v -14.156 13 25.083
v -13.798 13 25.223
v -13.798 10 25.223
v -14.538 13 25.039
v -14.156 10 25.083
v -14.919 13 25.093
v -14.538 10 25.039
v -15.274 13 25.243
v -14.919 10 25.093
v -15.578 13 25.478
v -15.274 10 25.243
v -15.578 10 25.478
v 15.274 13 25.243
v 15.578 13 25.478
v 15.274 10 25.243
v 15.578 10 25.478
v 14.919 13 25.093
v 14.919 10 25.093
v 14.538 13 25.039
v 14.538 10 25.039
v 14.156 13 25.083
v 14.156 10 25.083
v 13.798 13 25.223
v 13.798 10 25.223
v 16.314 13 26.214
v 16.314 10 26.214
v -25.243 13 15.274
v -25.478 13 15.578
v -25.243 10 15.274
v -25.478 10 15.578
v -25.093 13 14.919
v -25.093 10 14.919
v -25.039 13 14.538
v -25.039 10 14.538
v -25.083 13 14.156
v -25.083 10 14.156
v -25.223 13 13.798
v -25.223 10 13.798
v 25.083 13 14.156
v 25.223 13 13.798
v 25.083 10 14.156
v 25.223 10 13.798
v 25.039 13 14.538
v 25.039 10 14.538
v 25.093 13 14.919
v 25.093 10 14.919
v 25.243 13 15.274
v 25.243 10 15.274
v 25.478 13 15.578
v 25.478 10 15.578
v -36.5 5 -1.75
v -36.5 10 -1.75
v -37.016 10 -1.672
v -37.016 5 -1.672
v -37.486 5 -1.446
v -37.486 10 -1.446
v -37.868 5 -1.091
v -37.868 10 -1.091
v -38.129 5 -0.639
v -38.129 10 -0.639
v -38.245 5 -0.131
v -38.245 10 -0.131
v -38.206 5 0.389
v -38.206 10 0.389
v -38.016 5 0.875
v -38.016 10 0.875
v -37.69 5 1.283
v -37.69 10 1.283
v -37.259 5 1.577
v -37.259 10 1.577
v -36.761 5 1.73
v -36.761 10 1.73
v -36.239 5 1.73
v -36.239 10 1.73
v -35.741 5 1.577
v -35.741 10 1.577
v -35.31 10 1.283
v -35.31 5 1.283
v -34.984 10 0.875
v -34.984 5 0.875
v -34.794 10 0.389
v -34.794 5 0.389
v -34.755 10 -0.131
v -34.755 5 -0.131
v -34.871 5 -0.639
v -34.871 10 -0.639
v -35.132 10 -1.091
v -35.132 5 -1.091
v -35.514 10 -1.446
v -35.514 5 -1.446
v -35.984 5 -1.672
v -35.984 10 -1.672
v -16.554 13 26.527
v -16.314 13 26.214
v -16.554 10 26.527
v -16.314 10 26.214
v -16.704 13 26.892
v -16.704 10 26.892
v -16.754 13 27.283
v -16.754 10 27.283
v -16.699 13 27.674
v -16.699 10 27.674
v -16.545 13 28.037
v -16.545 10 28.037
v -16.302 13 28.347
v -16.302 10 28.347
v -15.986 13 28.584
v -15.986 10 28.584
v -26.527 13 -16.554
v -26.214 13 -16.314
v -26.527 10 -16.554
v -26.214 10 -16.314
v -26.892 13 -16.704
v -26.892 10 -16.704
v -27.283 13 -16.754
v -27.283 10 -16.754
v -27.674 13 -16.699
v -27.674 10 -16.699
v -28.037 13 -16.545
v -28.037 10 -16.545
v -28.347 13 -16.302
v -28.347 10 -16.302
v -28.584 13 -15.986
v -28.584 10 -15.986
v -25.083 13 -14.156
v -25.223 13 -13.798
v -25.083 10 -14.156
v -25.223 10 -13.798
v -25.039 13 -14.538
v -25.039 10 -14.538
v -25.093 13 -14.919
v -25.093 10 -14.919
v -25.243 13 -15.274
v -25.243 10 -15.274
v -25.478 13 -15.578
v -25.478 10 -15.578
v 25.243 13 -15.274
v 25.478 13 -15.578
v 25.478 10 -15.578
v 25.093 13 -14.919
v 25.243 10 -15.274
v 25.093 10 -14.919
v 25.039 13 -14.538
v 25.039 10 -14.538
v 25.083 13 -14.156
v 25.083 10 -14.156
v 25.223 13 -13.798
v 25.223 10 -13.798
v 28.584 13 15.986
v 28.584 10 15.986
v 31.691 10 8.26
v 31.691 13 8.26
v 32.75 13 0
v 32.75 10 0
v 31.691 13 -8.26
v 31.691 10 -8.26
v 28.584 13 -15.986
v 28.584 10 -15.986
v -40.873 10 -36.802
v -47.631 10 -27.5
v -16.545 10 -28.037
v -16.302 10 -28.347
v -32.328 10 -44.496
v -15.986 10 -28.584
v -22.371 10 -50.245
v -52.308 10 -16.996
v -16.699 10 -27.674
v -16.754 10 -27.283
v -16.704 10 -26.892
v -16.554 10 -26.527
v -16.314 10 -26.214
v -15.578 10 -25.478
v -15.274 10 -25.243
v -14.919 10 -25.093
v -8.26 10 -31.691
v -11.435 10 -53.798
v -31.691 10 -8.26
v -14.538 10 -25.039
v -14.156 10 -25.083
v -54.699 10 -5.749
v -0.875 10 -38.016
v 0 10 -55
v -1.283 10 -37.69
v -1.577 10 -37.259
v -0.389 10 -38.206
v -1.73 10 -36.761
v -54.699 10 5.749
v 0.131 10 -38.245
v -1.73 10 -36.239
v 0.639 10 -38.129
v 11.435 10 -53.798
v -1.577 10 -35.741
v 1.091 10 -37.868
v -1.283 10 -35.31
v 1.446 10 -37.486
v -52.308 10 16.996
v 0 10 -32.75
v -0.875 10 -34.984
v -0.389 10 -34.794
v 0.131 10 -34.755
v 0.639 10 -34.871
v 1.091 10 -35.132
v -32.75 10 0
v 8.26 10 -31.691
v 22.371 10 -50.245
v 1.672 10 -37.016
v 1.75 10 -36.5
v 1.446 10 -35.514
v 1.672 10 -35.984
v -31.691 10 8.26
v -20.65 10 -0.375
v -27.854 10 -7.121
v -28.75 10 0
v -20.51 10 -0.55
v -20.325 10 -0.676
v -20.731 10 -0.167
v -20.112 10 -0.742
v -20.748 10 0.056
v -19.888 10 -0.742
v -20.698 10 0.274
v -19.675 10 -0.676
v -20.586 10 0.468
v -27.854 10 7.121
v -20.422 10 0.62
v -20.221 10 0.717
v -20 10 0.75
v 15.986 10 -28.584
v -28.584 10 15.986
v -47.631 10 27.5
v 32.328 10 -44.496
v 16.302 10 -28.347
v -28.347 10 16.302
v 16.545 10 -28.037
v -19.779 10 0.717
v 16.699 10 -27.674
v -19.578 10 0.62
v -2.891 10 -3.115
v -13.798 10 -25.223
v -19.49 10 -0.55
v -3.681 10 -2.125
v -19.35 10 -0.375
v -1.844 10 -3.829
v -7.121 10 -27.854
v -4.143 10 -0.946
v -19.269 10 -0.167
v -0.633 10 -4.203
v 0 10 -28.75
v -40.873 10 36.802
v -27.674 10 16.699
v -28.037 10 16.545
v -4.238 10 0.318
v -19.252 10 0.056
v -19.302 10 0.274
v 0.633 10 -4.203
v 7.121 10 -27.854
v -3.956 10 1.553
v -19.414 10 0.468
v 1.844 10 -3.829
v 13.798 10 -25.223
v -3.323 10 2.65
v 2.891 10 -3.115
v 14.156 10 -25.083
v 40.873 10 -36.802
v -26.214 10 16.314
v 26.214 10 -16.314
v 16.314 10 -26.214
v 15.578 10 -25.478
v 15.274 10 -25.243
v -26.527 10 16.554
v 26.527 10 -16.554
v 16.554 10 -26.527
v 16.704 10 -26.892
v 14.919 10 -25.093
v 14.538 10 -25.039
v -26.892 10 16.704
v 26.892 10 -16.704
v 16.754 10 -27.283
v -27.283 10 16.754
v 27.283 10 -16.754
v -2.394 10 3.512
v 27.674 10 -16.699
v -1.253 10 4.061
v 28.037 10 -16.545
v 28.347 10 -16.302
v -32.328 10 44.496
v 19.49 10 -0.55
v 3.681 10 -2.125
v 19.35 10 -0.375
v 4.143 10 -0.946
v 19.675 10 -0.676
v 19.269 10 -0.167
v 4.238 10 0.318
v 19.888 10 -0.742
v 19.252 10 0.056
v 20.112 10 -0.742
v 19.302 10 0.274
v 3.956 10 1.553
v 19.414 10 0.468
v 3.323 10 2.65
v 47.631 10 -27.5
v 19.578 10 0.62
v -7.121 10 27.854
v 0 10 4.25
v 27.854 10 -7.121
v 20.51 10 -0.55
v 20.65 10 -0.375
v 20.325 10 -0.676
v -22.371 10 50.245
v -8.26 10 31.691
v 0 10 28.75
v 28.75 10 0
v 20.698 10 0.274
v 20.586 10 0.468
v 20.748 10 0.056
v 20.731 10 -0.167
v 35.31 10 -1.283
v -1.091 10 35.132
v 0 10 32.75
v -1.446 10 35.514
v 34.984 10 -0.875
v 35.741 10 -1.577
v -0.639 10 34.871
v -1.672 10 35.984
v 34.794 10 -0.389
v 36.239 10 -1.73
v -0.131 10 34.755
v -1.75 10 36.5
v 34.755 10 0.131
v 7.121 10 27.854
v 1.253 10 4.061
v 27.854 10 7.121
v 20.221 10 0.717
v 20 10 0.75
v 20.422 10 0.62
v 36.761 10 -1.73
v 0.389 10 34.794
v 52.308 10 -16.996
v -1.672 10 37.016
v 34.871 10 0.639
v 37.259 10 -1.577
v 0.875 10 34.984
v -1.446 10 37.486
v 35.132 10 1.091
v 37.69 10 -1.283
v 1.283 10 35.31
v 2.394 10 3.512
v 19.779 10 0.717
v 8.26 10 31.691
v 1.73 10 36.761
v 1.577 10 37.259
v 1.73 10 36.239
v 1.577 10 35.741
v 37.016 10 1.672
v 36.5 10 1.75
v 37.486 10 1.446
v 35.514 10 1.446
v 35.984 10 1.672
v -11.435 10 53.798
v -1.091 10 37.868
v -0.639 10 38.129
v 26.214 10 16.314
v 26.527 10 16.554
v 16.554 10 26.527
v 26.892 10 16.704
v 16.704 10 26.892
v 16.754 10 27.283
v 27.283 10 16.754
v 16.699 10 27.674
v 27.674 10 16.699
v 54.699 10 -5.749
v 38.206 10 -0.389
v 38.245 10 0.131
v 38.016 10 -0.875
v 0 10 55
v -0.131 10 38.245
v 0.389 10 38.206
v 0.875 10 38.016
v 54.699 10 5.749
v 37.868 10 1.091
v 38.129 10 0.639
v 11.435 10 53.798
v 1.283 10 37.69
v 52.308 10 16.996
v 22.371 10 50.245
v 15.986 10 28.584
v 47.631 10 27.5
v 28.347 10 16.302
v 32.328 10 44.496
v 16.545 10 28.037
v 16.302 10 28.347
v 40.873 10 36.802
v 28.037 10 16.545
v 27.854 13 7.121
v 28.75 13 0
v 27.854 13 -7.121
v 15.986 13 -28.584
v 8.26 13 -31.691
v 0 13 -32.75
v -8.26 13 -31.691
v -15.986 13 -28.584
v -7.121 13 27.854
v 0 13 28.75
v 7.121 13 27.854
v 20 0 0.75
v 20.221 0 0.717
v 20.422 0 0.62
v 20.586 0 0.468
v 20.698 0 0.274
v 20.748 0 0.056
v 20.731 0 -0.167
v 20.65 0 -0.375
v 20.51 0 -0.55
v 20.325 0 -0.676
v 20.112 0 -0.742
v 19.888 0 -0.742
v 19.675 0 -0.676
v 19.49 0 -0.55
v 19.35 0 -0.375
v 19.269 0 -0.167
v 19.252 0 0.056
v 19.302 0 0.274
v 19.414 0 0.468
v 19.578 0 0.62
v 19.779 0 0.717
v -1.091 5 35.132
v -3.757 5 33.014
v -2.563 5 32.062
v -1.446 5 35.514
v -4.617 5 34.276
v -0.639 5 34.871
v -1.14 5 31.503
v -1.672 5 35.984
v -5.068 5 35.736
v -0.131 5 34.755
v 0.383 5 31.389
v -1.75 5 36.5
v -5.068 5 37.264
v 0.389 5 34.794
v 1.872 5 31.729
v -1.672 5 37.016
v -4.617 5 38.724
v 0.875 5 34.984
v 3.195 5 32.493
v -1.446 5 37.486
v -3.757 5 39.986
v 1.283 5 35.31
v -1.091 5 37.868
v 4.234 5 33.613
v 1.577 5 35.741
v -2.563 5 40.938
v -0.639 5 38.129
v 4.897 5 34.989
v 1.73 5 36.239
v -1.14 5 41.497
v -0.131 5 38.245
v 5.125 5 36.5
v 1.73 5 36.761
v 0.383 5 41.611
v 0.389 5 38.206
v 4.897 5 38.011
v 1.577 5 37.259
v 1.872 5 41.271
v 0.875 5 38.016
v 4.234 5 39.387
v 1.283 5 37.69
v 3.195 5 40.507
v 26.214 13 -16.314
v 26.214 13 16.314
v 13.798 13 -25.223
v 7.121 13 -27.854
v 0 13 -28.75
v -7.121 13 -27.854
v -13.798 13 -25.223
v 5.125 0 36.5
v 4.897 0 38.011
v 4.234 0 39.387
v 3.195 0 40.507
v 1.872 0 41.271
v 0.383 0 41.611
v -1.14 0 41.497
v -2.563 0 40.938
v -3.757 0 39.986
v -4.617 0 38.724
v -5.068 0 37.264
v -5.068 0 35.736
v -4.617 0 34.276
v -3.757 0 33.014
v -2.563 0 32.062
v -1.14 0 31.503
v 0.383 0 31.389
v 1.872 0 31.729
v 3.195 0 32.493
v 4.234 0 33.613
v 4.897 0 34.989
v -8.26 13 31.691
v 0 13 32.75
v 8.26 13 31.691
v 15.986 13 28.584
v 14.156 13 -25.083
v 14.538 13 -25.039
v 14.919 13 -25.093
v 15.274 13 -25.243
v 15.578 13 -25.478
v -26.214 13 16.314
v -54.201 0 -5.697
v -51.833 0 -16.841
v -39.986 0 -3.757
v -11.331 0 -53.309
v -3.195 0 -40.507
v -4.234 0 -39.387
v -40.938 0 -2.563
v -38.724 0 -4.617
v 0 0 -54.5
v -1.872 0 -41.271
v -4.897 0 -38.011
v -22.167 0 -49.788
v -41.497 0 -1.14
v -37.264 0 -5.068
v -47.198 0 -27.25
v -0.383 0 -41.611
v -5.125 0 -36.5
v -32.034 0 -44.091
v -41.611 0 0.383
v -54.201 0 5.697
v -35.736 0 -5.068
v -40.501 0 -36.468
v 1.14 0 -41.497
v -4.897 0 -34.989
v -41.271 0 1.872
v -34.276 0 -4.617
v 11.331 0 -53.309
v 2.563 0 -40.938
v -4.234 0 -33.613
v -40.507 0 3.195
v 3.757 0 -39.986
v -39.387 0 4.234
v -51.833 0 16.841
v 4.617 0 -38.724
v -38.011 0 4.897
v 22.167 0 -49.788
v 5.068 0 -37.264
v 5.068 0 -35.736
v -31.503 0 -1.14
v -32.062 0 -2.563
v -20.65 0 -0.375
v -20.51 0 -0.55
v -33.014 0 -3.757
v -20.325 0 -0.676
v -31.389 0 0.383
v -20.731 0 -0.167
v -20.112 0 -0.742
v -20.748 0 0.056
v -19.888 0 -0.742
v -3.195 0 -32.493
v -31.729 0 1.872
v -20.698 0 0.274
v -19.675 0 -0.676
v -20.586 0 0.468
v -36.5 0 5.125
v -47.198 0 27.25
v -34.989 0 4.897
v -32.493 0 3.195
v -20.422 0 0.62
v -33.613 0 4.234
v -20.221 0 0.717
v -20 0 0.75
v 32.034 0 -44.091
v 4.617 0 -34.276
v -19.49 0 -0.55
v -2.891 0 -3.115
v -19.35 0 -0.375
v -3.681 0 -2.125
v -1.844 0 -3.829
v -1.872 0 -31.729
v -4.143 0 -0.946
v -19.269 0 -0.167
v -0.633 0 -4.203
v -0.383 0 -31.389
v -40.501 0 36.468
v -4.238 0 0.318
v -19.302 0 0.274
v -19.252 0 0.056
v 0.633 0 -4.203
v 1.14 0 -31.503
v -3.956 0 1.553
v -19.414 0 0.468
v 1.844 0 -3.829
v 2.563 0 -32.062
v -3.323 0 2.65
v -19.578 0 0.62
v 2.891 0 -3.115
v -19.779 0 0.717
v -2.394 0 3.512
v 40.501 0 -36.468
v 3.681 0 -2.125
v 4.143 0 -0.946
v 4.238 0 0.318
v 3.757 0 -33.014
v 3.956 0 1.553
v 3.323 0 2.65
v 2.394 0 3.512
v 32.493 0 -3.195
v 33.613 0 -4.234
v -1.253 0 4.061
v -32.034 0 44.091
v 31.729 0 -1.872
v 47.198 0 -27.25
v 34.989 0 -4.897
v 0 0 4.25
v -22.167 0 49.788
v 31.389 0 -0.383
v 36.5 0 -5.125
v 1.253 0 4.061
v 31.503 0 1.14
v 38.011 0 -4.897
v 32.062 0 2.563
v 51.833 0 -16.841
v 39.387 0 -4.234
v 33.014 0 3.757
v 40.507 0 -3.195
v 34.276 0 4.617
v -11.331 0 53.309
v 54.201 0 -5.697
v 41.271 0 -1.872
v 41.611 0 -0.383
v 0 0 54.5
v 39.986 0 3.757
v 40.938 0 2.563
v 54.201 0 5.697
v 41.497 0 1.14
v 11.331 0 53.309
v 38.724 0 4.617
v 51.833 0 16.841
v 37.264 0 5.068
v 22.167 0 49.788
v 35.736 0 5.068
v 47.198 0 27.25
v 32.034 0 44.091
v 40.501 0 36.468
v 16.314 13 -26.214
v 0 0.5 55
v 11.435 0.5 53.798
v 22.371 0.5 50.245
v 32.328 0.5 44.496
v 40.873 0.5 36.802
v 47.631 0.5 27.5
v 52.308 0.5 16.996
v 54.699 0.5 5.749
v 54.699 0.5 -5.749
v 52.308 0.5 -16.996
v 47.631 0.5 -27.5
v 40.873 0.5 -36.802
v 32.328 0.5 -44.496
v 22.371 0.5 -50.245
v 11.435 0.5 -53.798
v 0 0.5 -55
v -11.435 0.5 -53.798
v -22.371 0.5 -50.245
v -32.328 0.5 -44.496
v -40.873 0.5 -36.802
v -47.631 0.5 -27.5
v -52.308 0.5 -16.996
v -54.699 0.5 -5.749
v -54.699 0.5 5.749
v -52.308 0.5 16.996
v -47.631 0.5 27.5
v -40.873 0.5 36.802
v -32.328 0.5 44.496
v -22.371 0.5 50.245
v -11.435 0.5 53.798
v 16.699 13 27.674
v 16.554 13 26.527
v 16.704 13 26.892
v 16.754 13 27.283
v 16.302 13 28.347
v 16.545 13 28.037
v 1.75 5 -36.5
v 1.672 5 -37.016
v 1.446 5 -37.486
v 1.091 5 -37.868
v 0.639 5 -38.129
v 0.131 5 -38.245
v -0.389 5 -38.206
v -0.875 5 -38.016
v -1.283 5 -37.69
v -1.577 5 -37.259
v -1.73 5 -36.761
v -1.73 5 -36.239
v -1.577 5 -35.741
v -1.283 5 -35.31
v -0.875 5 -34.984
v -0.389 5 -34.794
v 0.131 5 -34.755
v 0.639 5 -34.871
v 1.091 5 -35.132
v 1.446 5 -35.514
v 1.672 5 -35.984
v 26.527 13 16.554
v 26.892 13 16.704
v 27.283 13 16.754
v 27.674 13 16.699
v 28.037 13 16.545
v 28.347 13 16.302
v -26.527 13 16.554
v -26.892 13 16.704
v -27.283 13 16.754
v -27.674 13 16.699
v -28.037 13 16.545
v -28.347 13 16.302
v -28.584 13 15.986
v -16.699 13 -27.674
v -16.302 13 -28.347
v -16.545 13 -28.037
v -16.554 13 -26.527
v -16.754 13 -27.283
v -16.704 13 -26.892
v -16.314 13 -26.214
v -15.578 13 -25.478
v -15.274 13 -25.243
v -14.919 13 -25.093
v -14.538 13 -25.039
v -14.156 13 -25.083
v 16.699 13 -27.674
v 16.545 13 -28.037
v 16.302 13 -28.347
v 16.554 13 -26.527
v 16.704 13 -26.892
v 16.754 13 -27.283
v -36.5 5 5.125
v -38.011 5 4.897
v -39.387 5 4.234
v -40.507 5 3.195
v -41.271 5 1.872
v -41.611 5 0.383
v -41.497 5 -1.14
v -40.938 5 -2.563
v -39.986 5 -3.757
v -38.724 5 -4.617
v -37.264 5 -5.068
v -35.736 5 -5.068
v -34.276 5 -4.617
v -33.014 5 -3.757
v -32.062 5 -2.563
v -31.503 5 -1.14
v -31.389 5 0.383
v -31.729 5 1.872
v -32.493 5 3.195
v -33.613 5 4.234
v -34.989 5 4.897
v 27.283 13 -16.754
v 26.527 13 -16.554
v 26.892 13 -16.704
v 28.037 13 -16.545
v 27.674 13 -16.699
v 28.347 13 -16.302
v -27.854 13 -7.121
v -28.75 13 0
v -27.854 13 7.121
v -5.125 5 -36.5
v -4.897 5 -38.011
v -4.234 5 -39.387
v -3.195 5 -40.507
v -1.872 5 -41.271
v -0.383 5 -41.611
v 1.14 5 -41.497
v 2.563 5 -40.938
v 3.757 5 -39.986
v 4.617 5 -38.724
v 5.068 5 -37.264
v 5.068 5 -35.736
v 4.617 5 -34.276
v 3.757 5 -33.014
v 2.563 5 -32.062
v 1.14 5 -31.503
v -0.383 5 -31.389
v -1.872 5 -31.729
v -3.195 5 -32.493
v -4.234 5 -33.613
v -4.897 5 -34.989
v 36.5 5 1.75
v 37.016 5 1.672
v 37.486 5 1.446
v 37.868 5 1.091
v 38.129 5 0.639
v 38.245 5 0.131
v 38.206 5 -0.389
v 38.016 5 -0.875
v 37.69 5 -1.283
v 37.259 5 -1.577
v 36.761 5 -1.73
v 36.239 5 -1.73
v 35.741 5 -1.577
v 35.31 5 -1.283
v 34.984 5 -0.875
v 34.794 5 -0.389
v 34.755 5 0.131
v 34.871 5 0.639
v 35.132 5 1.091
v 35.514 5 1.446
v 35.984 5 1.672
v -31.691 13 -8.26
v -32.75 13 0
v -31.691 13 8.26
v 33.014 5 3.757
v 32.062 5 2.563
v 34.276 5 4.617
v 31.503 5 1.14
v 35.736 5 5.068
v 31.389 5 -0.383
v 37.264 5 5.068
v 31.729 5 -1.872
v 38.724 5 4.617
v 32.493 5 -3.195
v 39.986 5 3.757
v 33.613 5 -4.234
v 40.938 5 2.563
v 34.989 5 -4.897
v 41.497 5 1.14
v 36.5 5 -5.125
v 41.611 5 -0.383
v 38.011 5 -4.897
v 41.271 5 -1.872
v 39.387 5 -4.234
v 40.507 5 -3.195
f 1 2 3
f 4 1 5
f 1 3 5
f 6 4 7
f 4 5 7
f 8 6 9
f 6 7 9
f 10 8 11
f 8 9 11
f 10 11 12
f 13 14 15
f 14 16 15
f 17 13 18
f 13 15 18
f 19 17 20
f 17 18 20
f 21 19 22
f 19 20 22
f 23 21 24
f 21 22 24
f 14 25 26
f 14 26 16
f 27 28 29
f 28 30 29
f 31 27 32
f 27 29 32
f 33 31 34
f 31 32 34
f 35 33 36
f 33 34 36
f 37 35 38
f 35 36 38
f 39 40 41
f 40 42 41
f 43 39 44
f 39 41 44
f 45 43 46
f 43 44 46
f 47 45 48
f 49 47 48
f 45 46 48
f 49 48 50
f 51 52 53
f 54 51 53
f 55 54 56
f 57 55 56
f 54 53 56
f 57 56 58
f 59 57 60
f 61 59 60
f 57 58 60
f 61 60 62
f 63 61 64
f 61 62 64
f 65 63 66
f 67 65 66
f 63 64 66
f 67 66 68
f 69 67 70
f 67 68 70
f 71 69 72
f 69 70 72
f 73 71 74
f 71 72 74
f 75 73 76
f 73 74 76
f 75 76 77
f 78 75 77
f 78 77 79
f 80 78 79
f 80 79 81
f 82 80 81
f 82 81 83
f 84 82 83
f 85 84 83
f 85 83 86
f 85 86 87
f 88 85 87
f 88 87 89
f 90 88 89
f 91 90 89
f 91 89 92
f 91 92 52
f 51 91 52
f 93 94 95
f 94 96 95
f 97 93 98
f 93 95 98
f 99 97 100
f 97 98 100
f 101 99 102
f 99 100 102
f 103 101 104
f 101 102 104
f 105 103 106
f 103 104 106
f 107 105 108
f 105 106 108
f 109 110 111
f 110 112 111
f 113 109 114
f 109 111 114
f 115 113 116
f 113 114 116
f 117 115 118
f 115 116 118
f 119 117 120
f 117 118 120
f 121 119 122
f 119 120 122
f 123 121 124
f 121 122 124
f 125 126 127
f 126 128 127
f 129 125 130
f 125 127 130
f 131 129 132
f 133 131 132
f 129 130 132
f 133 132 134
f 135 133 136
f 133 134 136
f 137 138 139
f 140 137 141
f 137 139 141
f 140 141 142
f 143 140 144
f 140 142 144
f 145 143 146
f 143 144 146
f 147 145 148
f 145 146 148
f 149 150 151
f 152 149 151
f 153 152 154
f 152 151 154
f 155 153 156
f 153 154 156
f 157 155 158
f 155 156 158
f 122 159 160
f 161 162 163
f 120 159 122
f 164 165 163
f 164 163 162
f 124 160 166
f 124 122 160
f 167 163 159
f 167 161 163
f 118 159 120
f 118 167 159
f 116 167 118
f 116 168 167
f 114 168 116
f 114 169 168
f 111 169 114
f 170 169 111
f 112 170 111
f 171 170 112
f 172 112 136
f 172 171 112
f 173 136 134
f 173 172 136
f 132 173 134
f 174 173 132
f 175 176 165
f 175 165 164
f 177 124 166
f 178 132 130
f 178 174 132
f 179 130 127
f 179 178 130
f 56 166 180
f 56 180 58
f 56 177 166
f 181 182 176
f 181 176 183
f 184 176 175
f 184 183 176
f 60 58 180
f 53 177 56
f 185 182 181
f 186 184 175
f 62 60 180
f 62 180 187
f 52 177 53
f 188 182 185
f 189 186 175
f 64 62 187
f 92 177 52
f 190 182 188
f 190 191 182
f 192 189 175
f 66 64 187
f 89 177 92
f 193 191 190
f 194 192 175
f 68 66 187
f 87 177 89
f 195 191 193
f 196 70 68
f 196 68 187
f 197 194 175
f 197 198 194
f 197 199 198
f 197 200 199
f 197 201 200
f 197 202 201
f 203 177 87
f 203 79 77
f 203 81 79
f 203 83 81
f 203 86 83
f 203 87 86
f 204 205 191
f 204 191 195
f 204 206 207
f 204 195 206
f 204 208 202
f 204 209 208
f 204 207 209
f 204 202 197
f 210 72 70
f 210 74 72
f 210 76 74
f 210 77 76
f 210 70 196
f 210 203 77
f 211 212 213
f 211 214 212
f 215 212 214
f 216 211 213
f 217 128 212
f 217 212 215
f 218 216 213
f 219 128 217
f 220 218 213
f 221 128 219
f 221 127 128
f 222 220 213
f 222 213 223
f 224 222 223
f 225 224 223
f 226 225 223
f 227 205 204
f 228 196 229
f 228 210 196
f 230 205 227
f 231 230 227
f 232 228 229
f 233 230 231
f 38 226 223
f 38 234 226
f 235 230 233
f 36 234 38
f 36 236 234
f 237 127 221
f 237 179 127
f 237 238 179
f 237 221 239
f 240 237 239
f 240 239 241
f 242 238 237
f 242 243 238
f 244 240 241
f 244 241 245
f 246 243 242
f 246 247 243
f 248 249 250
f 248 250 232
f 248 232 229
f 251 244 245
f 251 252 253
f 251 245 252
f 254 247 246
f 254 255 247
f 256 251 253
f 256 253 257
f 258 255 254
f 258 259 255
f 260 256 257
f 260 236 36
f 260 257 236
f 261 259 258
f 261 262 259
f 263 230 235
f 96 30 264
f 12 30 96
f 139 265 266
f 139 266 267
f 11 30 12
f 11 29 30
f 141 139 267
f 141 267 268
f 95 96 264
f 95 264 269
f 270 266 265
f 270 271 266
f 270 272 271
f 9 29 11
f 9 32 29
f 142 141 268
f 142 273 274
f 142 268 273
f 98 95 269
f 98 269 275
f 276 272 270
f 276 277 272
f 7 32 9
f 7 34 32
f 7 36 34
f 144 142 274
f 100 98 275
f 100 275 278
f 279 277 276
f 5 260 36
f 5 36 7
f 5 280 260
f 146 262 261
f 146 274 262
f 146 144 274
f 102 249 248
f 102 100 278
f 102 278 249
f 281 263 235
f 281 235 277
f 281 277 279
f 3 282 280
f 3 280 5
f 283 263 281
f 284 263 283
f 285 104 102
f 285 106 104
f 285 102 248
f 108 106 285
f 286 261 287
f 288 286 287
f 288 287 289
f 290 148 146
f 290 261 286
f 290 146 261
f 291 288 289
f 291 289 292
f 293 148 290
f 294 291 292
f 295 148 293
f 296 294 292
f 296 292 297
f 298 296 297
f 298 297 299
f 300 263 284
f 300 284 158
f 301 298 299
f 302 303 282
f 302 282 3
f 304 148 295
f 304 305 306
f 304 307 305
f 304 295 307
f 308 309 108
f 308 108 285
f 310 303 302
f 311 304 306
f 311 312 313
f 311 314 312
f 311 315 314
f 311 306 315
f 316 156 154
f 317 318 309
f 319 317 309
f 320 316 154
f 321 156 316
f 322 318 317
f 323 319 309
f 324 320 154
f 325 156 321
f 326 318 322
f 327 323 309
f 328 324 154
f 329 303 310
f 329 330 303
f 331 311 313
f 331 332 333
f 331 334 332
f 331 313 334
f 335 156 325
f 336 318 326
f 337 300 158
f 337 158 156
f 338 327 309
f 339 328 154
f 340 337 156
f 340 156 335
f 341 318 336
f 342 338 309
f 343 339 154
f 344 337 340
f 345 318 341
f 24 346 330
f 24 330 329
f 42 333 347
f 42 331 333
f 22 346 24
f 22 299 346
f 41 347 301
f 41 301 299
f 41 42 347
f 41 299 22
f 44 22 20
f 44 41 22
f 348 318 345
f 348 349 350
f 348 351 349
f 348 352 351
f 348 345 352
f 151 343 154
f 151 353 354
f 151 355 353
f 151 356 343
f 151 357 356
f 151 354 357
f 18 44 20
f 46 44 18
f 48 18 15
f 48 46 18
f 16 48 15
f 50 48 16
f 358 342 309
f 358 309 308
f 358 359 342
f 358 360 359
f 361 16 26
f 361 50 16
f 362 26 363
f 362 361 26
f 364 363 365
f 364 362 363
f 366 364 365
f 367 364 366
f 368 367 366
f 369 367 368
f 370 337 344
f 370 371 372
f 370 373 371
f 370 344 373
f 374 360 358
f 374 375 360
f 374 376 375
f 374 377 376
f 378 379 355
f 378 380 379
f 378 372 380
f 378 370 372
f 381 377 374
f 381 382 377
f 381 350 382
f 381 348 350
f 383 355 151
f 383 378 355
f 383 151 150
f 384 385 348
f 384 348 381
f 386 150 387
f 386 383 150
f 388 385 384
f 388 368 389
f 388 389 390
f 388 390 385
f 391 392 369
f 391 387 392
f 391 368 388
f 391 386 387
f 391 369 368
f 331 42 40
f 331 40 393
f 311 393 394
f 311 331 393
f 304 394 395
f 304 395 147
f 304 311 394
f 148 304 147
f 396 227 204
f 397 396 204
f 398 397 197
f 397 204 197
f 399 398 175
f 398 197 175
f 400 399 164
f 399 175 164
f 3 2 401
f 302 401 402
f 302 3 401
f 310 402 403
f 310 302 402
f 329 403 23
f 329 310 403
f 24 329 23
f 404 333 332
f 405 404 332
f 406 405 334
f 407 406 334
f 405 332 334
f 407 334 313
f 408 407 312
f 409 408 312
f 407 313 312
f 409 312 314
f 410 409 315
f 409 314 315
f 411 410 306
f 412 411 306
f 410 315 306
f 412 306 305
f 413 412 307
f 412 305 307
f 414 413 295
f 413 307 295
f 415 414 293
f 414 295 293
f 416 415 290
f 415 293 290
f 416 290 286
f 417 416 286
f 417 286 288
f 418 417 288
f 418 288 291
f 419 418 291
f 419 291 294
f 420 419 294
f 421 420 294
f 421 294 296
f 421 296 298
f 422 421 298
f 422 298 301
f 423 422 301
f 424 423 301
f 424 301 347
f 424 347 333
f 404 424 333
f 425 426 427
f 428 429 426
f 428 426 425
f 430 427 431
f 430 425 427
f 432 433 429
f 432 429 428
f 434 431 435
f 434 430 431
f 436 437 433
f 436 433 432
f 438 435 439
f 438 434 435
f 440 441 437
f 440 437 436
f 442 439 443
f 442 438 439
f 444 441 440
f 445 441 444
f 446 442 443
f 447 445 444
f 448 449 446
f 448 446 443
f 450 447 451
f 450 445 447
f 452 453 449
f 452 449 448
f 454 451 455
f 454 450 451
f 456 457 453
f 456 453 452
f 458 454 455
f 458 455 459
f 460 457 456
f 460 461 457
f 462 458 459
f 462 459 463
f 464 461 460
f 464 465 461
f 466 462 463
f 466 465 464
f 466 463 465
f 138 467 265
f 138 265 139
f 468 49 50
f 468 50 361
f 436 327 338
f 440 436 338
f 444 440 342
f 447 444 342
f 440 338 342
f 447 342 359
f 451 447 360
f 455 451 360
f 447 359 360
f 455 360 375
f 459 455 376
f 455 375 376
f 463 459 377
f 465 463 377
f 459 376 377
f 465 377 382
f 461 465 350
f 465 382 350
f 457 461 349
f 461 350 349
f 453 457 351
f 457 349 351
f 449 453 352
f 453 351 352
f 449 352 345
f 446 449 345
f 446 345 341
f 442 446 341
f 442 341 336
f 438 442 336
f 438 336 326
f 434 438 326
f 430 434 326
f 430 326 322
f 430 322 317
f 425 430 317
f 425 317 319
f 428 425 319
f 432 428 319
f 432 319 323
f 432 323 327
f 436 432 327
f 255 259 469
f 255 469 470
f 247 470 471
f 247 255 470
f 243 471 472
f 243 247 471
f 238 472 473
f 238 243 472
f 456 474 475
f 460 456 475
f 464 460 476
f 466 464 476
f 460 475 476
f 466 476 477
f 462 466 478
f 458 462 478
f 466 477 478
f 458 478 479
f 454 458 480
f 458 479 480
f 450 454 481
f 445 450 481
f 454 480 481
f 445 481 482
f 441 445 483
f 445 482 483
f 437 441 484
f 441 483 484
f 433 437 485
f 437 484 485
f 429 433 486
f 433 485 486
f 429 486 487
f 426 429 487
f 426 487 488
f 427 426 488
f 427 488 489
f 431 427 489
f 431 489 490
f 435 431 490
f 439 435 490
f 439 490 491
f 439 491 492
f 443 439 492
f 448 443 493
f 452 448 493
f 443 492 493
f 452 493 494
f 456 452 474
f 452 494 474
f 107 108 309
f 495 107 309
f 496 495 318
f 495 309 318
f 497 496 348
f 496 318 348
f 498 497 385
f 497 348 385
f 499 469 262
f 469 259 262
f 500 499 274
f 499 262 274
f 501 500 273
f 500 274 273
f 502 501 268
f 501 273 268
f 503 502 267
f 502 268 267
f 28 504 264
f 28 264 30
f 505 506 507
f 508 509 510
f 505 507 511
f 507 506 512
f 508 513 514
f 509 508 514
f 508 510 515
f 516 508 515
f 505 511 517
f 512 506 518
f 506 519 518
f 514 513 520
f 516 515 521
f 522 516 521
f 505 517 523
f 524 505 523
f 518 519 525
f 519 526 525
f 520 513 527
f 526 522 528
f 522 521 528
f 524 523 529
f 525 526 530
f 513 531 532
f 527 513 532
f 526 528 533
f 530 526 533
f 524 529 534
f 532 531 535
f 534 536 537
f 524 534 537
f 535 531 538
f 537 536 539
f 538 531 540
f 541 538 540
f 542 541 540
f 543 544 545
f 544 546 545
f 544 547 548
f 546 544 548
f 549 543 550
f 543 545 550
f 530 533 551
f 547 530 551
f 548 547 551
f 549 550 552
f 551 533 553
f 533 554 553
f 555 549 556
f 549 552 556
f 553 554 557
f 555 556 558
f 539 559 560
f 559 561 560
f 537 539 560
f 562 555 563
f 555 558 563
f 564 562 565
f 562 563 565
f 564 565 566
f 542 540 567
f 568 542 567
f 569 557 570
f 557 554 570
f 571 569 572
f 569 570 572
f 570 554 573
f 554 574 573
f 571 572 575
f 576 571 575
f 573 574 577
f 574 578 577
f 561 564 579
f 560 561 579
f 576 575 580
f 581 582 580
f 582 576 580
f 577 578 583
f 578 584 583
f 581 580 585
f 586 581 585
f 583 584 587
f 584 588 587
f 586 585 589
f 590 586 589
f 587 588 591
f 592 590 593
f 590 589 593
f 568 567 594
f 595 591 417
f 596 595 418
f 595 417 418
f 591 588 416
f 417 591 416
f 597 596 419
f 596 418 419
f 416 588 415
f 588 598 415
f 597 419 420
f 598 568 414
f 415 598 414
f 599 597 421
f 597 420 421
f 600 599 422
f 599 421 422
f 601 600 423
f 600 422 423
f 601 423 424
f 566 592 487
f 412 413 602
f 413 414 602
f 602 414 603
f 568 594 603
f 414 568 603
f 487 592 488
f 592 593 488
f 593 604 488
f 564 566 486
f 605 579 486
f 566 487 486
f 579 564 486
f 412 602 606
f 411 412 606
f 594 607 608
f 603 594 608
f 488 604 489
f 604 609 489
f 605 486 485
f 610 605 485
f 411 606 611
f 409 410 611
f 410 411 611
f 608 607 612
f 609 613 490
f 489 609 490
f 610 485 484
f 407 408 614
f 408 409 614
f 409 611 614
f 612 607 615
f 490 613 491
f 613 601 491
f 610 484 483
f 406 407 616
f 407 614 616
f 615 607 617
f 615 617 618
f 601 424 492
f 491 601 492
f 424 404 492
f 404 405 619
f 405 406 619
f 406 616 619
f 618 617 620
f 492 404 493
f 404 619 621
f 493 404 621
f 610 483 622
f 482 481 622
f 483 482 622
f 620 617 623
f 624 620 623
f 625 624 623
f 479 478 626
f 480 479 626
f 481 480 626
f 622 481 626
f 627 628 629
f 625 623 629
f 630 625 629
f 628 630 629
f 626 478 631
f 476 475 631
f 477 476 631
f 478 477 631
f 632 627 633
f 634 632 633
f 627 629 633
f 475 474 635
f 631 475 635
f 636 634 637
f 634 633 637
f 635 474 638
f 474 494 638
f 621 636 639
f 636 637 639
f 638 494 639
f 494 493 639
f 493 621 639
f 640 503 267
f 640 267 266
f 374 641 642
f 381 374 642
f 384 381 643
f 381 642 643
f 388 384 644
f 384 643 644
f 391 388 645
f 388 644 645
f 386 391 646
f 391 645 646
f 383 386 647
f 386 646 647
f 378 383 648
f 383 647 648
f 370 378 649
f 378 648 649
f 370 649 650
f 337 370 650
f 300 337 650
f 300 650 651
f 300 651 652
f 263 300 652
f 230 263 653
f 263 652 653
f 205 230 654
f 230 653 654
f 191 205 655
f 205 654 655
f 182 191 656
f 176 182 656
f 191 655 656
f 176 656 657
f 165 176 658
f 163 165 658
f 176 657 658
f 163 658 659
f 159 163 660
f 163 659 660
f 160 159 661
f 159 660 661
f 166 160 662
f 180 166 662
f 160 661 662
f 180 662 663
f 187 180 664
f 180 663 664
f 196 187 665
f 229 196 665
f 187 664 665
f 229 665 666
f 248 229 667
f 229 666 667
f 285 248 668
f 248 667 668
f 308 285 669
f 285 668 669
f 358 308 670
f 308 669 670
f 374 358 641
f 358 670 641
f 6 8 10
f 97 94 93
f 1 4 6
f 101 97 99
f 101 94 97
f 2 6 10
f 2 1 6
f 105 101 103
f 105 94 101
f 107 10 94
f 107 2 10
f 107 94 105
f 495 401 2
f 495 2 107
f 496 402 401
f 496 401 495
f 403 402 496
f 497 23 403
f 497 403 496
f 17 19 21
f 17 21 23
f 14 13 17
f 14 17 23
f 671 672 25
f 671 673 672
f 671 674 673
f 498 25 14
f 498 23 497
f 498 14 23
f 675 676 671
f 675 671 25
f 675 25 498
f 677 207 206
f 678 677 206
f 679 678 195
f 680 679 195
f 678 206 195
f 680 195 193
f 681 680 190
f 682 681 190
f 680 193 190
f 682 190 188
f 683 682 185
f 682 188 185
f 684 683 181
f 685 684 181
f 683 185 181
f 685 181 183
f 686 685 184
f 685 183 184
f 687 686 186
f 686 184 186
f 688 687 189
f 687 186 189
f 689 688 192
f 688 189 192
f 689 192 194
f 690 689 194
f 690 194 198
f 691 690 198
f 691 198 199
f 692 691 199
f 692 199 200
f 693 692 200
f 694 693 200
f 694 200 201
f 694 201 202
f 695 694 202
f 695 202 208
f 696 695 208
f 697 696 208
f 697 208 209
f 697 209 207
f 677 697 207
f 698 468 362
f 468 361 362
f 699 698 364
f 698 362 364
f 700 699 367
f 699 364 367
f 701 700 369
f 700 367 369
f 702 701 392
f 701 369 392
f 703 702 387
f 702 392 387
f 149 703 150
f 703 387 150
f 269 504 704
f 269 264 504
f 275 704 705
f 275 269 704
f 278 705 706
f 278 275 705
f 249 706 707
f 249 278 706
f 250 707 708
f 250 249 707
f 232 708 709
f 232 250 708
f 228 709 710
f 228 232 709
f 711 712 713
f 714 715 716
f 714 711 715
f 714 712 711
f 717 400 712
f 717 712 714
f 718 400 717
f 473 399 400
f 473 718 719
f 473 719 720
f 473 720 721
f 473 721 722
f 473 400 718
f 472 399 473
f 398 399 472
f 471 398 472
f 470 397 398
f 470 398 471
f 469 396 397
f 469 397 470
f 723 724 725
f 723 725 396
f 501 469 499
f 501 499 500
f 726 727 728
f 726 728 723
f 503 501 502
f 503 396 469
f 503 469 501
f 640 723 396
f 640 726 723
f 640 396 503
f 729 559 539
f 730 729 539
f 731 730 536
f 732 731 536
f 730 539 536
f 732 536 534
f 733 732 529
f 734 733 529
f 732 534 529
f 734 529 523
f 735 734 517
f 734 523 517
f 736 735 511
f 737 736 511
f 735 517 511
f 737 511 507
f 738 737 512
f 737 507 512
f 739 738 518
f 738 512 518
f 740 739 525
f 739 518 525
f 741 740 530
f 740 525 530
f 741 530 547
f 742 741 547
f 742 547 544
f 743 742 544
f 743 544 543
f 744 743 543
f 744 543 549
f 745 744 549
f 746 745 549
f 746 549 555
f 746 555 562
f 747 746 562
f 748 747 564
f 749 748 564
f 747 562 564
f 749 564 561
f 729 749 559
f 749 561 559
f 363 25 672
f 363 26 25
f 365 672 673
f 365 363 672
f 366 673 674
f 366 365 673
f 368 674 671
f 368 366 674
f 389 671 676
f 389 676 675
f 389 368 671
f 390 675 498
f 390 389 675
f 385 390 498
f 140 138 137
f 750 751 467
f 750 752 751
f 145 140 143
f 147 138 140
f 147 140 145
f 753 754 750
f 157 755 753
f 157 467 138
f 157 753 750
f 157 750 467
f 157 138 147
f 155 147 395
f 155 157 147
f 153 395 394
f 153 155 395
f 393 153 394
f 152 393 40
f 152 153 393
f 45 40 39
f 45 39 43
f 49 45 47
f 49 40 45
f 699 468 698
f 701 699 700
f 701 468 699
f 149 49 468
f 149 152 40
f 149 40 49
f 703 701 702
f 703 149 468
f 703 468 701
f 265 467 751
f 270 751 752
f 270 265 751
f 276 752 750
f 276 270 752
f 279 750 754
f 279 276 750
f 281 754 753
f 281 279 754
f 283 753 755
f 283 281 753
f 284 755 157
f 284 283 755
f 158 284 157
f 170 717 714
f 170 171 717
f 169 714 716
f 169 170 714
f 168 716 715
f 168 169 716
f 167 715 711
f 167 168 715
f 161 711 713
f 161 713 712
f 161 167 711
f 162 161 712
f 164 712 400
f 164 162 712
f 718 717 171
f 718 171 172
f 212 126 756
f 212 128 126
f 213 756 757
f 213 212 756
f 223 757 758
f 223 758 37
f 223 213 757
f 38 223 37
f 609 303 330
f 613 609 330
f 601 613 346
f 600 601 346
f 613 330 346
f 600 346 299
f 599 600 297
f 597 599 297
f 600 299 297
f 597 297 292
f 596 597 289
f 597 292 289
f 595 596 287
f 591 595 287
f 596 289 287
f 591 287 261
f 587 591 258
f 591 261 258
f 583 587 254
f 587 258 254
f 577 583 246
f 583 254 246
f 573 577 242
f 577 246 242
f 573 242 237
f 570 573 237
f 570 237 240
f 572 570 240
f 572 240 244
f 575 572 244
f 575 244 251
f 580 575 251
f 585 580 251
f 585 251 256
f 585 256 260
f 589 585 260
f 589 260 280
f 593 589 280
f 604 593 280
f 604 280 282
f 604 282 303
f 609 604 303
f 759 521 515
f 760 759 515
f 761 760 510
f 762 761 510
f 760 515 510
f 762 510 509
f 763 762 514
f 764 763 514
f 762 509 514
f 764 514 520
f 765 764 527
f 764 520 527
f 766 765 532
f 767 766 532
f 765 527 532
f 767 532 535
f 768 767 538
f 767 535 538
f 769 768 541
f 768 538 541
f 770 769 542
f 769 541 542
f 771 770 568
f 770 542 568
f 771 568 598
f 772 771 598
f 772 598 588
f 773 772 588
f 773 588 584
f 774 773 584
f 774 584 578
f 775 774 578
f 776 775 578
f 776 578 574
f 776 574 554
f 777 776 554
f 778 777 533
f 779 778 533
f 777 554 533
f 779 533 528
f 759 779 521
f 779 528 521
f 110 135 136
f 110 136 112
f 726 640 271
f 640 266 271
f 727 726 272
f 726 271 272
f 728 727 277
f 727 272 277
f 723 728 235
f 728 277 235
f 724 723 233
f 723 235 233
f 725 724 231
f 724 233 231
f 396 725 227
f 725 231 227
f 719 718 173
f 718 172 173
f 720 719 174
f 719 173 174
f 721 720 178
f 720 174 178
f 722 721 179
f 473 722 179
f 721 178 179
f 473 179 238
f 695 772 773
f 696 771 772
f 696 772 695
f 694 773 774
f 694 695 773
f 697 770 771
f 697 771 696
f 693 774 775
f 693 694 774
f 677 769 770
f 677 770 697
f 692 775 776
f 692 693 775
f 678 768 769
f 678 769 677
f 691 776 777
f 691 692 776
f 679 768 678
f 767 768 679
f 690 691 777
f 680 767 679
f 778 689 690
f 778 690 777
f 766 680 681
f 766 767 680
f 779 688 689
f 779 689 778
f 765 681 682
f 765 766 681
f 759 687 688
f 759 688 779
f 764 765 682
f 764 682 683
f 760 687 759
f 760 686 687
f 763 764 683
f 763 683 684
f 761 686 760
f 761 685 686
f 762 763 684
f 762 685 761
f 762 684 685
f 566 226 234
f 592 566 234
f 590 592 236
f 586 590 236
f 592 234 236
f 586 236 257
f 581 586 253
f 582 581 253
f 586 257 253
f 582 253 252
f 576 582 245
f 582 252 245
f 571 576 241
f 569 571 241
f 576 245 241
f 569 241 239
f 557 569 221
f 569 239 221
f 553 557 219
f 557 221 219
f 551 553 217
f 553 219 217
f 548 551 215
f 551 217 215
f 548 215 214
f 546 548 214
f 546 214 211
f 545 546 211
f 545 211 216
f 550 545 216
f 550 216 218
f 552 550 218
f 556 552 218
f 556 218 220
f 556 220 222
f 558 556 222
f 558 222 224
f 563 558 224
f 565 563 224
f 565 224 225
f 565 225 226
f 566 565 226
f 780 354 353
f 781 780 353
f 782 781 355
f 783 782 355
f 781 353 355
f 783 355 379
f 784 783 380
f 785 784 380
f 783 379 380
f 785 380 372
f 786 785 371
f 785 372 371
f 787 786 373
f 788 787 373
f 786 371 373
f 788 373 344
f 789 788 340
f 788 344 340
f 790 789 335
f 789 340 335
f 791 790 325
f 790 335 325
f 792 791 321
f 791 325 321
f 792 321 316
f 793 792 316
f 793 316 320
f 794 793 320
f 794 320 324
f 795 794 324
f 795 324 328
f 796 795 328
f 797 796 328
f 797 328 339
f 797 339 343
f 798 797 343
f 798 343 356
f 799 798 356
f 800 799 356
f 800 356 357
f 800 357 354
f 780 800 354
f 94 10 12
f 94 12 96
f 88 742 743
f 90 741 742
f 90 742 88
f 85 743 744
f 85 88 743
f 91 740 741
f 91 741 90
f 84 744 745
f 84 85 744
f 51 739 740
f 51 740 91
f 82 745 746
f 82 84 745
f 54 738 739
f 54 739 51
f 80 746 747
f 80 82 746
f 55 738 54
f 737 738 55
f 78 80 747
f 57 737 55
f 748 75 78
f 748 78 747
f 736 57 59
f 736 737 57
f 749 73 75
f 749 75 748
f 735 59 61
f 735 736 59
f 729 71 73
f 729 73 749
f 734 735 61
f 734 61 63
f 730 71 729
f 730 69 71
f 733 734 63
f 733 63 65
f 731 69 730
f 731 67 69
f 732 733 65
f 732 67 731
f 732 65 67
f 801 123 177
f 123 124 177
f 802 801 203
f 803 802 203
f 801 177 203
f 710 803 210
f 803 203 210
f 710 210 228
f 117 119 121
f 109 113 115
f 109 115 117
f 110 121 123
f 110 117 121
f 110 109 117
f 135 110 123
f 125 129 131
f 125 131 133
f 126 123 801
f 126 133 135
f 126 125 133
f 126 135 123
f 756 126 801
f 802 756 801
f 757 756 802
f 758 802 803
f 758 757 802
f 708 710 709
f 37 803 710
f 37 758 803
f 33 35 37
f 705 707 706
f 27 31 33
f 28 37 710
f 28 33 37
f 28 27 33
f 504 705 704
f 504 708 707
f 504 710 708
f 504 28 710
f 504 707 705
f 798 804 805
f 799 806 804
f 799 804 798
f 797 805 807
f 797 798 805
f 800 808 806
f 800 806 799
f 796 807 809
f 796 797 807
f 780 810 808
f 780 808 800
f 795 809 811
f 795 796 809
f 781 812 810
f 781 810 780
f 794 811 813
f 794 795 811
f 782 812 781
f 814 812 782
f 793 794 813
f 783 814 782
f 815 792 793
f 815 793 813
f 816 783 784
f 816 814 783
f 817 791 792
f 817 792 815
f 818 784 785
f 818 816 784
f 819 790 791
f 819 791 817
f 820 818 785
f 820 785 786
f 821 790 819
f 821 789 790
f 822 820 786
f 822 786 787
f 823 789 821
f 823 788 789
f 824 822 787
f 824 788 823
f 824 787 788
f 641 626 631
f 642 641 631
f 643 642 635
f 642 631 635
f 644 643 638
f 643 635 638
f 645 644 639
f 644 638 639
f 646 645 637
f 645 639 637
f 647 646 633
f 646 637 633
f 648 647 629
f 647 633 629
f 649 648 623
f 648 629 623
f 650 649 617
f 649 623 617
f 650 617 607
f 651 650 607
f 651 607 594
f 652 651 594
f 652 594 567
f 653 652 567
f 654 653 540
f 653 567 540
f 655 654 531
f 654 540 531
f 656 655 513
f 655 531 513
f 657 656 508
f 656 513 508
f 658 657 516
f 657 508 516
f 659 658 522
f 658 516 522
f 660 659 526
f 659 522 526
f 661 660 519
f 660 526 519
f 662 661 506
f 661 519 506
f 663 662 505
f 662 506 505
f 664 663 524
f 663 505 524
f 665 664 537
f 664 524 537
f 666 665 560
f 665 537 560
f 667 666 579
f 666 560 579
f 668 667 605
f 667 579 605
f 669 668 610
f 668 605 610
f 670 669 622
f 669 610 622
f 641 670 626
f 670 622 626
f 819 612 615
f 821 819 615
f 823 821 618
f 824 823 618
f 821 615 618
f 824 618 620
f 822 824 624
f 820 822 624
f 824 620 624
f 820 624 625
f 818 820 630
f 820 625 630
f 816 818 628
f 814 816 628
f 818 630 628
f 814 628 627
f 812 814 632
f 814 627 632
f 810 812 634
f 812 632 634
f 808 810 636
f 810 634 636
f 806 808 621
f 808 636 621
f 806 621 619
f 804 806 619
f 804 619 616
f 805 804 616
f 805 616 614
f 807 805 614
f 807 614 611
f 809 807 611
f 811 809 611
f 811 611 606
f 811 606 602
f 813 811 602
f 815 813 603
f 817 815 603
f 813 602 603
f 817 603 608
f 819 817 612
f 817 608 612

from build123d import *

# Parameters (mm, degrees)
SKETCH1_R           = 55
BOSS_EXTRUDE1_DEPTH = 10
SKETCH2_R           = 4.25
CUT_EXTRUDE1_DEPTH  = 79.421935707
SKETCH3_R           = 0.75
CUT_EXTRUDE2_DEPTH  = 79.421935707
SKETCH4_R           = 32.75
SKETCH4_R_2         = 28.75
BOSS_EXTRUDE2_DEPTH = 3
CUT_EXTRUDE3_DEPTH  = 3
FILLET1_R           = 1.5
SKETCH6_R           = 1.75
CUT_EXTRUDE4_DEPTH  = 79.421935707
SKETCH7_R           = 5.125
CUT_EXTRUDE5_DEPTH  = 5
CIRPATTERN1_COUNT   = 4
CHAMFER1_SIZE       = 0.5


with BuildPart() as part:
    # Sketch1 → Boss-Extrude1 (new body)
    with BuildSketch(Plane(origin=(0, 0, 0), x_dir=(1, 0, 0), z_dir=(0, 1, 0))):
        with Locations(Location((0, 0, 0), (0, 0, 270))):
            Circle(SKETCH1_R)
    extrude(amount=BOSS_EXTRUDE1_DEPTH)

    # Sketch2 → Cut-Extrude1 (cut, through all)
    with BuildSketch(Plane(origin=(0, 10, 0), x_dir=(1, 0, 0), z_dir=(0, 1, 0))):
        with Locations(Location((0, 0, 0), (0, 0, 270))):
            Circle(SKETCH2_R)
    extrude(amount=-CUT_EXTRUDE1_DEPTH, mode=Mode.SUBTRACT)

    # Sketch3 → Cut-Extrude2 (cut, through all)
    with BuildSketch(Plane(origin=(0, 10, 0), x_dir=(1, 0, 0), z_dir=(0, 1, 0))):
        with Locations(Location((-20, 0, 0), (0, 0, 270))):
            Circle(SKETCH3_R)
        with Locations(Location((20, 0, 0), (0, 0, 270))):
            Circle(SKETCH3_R)
    extrude(amount=-CUT_EXTRUDE2_DEPTH, mode=Mode.SUBTRACT)

    # Sketch4 → Boss-Extrude2 (add)
    with BuildSketch(Plane(origin=(0, 10, 0), x_dir=(1, 0, 0), z_dir=(0, 1, 0))):
        with Locations(Location((0, 0, 0), (0, 0, 270))):
            Circle(SKETCH4_R)
        with Locations(Location((0, 0, 0), (0, 0, 270))):
            Circle(SKETCH4_R_2, mode=Mode.SUBTRACT)
    extrude(amount=BOSS_EXTRUDE2_DEPTH)

    # Sketch5 → Cut-Extrude3 (cut)
    with BuildSketch(Plane(origin=(0, 13, 0), x_dir=(1, 0, 0), z_dir=(0, 1, 0))):
        Polygon((-36.203629602, 26.304134665), (-26.304134665, 36.203629602), (0, 9.899494937), (26.527588401, 36.427083337), (36.427083337, 26.527588401), (9.899494937, 0), (37.563449253, -27.663954316), (27.663954316, -37.563449253), (0, -9.899494937), (-22.89121747, -32.790712406), (-32.790712406, -22.89121747), (-9.899494937, 0), align=None)
    extrude(amount=-CUT_EXTRUDE3_DEPTH, mode=Mode.SUBTRACT)

    # Fillet1
    fillet1_edges = [part.edges().sort_by_distance(p)[0] for p in [
        (-24.667284079, 11.5, 14.767789143),
        (-14.767789143, 11.5, 24.667284079),
        (14.767789143, 11.5, 24.667284079),
        (24.667284079, 11.5, 14.767789143),
        (24.667284079, 11.5, -14.767789143),
        (14.767789143, 11.5, -24.667284079),
        (-14.767789143, 11.5, -24.667284079),
        (-24.667284079, 11.5, -14.767789143),
        (-27.572330212, 11.5, -17.672835275),
        (-17.672835275, 11.5, -27.572330212),
        (17.672835275, 11.5, -27.572330212),
        (27.572330212, 11.5, -17.672835275),
        (27.572330212, 11.5, 17.672835275),
        (17.672835275, 11.5, 27.572330212),
        (-17.672835275, 11.5, 27.572330212),
        (-27.572330212, 11.5, 17.672835275),
    ]]
    fillet(fillet1_edges, radius=FILLET1_R)

    # Sketch6 → Cut-Extrude4 (cut, through all)
    with BuildSketch(Plane(origin=(0, 10, 0), x_dir=(1, 0, 0), z_dir=(0, 1, 0))):
        with Locations(Location((36.5, 0, 0), (0, 0, 270))):
            Circle(SKETCH6_R)
    cut_extrude4 = extrude(amount=-CUT_EXTRUDE4_DEPTH, mode=Mode.SUBTRACT)

    # Sketch7 → Cut-Extrude5 (cut)
    with BuildSketch(Plane.XZ):
        with Locations(Location((36.5, 0, 0), (0, 0, 270))):
            Circle(SKETCH7_R)
    cut_extrude5 = extrude(amount=-CUT_EXTRUDE5_DEPTH, mode=Mode.SUBTRACT)

    # CirPattern1: Cut-Extrude4, Cut-Extrude5 ×4 about axis
    cirpattern1_axis = Axis((0, 0, 0), (0, 1, 0))
    add([cut_extrude4.rotate(cirpattern1_axis, i * 360 / CIRPATTERN1_COUNT) for i in range(1, CIRPATTERN1_COUNT)], mode=Mode.SUBTRACT)
    add([cut_extrude5.rotate(cirpattern1_axis, i * 360 / CIRPATTERN1_COUNT) for i in range(1, CIRPATTERN1_COUNT)], mode=Mode.SUBTRACT)

    # Chamfer1
    chamfer1_edges = [part.edges().sort_by_distance(p)[0] for p in [
        (0, 0, -55),
    ]]
    chamfer(chamfer1_edges, length=CHAMFER1_SIZE)


solid = part.part
